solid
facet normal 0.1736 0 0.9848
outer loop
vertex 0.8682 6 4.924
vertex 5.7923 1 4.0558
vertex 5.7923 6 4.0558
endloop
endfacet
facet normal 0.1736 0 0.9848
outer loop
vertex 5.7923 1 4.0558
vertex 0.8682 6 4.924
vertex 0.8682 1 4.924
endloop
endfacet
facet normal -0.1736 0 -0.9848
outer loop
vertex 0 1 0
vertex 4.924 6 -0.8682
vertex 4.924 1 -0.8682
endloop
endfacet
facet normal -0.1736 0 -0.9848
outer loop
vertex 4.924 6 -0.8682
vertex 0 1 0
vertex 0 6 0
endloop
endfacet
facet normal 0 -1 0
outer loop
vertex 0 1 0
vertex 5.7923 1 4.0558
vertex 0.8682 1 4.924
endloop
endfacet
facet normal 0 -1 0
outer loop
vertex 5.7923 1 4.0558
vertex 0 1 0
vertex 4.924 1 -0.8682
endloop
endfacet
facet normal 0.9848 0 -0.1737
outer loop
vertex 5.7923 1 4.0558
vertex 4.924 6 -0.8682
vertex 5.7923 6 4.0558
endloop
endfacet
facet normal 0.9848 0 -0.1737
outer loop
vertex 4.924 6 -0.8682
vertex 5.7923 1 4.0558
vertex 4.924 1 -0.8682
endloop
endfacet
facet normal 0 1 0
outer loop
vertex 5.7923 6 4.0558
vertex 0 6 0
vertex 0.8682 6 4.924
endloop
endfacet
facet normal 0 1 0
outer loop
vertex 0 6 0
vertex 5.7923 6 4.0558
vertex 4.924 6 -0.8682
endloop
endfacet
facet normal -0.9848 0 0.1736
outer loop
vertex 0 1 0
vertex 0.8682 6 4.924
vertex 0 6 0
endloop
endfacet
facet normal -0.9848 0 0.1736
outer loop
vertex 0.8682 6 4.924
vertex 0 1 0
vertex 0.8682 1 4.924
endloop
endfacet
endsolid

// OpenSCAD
module transform(t=[0,0,0],r=[0,0,0], depth=0){
	translate(t){
		rotate(r){
			if(depth>10){
				transform(t*1.5,r*1.5,depth+1){
					 for (i = [0 : $children-1]){
						 child(i);
					 }
				}
			}else{
				for (i = [0 : $children-1]){
					 child(i);
				}
			}
		}
	}
}

module topLevel(){
	transform(t=[0,1,0],r=[0,10,0]){
		cube([5,5,5]);
	}
}

topLevel();
